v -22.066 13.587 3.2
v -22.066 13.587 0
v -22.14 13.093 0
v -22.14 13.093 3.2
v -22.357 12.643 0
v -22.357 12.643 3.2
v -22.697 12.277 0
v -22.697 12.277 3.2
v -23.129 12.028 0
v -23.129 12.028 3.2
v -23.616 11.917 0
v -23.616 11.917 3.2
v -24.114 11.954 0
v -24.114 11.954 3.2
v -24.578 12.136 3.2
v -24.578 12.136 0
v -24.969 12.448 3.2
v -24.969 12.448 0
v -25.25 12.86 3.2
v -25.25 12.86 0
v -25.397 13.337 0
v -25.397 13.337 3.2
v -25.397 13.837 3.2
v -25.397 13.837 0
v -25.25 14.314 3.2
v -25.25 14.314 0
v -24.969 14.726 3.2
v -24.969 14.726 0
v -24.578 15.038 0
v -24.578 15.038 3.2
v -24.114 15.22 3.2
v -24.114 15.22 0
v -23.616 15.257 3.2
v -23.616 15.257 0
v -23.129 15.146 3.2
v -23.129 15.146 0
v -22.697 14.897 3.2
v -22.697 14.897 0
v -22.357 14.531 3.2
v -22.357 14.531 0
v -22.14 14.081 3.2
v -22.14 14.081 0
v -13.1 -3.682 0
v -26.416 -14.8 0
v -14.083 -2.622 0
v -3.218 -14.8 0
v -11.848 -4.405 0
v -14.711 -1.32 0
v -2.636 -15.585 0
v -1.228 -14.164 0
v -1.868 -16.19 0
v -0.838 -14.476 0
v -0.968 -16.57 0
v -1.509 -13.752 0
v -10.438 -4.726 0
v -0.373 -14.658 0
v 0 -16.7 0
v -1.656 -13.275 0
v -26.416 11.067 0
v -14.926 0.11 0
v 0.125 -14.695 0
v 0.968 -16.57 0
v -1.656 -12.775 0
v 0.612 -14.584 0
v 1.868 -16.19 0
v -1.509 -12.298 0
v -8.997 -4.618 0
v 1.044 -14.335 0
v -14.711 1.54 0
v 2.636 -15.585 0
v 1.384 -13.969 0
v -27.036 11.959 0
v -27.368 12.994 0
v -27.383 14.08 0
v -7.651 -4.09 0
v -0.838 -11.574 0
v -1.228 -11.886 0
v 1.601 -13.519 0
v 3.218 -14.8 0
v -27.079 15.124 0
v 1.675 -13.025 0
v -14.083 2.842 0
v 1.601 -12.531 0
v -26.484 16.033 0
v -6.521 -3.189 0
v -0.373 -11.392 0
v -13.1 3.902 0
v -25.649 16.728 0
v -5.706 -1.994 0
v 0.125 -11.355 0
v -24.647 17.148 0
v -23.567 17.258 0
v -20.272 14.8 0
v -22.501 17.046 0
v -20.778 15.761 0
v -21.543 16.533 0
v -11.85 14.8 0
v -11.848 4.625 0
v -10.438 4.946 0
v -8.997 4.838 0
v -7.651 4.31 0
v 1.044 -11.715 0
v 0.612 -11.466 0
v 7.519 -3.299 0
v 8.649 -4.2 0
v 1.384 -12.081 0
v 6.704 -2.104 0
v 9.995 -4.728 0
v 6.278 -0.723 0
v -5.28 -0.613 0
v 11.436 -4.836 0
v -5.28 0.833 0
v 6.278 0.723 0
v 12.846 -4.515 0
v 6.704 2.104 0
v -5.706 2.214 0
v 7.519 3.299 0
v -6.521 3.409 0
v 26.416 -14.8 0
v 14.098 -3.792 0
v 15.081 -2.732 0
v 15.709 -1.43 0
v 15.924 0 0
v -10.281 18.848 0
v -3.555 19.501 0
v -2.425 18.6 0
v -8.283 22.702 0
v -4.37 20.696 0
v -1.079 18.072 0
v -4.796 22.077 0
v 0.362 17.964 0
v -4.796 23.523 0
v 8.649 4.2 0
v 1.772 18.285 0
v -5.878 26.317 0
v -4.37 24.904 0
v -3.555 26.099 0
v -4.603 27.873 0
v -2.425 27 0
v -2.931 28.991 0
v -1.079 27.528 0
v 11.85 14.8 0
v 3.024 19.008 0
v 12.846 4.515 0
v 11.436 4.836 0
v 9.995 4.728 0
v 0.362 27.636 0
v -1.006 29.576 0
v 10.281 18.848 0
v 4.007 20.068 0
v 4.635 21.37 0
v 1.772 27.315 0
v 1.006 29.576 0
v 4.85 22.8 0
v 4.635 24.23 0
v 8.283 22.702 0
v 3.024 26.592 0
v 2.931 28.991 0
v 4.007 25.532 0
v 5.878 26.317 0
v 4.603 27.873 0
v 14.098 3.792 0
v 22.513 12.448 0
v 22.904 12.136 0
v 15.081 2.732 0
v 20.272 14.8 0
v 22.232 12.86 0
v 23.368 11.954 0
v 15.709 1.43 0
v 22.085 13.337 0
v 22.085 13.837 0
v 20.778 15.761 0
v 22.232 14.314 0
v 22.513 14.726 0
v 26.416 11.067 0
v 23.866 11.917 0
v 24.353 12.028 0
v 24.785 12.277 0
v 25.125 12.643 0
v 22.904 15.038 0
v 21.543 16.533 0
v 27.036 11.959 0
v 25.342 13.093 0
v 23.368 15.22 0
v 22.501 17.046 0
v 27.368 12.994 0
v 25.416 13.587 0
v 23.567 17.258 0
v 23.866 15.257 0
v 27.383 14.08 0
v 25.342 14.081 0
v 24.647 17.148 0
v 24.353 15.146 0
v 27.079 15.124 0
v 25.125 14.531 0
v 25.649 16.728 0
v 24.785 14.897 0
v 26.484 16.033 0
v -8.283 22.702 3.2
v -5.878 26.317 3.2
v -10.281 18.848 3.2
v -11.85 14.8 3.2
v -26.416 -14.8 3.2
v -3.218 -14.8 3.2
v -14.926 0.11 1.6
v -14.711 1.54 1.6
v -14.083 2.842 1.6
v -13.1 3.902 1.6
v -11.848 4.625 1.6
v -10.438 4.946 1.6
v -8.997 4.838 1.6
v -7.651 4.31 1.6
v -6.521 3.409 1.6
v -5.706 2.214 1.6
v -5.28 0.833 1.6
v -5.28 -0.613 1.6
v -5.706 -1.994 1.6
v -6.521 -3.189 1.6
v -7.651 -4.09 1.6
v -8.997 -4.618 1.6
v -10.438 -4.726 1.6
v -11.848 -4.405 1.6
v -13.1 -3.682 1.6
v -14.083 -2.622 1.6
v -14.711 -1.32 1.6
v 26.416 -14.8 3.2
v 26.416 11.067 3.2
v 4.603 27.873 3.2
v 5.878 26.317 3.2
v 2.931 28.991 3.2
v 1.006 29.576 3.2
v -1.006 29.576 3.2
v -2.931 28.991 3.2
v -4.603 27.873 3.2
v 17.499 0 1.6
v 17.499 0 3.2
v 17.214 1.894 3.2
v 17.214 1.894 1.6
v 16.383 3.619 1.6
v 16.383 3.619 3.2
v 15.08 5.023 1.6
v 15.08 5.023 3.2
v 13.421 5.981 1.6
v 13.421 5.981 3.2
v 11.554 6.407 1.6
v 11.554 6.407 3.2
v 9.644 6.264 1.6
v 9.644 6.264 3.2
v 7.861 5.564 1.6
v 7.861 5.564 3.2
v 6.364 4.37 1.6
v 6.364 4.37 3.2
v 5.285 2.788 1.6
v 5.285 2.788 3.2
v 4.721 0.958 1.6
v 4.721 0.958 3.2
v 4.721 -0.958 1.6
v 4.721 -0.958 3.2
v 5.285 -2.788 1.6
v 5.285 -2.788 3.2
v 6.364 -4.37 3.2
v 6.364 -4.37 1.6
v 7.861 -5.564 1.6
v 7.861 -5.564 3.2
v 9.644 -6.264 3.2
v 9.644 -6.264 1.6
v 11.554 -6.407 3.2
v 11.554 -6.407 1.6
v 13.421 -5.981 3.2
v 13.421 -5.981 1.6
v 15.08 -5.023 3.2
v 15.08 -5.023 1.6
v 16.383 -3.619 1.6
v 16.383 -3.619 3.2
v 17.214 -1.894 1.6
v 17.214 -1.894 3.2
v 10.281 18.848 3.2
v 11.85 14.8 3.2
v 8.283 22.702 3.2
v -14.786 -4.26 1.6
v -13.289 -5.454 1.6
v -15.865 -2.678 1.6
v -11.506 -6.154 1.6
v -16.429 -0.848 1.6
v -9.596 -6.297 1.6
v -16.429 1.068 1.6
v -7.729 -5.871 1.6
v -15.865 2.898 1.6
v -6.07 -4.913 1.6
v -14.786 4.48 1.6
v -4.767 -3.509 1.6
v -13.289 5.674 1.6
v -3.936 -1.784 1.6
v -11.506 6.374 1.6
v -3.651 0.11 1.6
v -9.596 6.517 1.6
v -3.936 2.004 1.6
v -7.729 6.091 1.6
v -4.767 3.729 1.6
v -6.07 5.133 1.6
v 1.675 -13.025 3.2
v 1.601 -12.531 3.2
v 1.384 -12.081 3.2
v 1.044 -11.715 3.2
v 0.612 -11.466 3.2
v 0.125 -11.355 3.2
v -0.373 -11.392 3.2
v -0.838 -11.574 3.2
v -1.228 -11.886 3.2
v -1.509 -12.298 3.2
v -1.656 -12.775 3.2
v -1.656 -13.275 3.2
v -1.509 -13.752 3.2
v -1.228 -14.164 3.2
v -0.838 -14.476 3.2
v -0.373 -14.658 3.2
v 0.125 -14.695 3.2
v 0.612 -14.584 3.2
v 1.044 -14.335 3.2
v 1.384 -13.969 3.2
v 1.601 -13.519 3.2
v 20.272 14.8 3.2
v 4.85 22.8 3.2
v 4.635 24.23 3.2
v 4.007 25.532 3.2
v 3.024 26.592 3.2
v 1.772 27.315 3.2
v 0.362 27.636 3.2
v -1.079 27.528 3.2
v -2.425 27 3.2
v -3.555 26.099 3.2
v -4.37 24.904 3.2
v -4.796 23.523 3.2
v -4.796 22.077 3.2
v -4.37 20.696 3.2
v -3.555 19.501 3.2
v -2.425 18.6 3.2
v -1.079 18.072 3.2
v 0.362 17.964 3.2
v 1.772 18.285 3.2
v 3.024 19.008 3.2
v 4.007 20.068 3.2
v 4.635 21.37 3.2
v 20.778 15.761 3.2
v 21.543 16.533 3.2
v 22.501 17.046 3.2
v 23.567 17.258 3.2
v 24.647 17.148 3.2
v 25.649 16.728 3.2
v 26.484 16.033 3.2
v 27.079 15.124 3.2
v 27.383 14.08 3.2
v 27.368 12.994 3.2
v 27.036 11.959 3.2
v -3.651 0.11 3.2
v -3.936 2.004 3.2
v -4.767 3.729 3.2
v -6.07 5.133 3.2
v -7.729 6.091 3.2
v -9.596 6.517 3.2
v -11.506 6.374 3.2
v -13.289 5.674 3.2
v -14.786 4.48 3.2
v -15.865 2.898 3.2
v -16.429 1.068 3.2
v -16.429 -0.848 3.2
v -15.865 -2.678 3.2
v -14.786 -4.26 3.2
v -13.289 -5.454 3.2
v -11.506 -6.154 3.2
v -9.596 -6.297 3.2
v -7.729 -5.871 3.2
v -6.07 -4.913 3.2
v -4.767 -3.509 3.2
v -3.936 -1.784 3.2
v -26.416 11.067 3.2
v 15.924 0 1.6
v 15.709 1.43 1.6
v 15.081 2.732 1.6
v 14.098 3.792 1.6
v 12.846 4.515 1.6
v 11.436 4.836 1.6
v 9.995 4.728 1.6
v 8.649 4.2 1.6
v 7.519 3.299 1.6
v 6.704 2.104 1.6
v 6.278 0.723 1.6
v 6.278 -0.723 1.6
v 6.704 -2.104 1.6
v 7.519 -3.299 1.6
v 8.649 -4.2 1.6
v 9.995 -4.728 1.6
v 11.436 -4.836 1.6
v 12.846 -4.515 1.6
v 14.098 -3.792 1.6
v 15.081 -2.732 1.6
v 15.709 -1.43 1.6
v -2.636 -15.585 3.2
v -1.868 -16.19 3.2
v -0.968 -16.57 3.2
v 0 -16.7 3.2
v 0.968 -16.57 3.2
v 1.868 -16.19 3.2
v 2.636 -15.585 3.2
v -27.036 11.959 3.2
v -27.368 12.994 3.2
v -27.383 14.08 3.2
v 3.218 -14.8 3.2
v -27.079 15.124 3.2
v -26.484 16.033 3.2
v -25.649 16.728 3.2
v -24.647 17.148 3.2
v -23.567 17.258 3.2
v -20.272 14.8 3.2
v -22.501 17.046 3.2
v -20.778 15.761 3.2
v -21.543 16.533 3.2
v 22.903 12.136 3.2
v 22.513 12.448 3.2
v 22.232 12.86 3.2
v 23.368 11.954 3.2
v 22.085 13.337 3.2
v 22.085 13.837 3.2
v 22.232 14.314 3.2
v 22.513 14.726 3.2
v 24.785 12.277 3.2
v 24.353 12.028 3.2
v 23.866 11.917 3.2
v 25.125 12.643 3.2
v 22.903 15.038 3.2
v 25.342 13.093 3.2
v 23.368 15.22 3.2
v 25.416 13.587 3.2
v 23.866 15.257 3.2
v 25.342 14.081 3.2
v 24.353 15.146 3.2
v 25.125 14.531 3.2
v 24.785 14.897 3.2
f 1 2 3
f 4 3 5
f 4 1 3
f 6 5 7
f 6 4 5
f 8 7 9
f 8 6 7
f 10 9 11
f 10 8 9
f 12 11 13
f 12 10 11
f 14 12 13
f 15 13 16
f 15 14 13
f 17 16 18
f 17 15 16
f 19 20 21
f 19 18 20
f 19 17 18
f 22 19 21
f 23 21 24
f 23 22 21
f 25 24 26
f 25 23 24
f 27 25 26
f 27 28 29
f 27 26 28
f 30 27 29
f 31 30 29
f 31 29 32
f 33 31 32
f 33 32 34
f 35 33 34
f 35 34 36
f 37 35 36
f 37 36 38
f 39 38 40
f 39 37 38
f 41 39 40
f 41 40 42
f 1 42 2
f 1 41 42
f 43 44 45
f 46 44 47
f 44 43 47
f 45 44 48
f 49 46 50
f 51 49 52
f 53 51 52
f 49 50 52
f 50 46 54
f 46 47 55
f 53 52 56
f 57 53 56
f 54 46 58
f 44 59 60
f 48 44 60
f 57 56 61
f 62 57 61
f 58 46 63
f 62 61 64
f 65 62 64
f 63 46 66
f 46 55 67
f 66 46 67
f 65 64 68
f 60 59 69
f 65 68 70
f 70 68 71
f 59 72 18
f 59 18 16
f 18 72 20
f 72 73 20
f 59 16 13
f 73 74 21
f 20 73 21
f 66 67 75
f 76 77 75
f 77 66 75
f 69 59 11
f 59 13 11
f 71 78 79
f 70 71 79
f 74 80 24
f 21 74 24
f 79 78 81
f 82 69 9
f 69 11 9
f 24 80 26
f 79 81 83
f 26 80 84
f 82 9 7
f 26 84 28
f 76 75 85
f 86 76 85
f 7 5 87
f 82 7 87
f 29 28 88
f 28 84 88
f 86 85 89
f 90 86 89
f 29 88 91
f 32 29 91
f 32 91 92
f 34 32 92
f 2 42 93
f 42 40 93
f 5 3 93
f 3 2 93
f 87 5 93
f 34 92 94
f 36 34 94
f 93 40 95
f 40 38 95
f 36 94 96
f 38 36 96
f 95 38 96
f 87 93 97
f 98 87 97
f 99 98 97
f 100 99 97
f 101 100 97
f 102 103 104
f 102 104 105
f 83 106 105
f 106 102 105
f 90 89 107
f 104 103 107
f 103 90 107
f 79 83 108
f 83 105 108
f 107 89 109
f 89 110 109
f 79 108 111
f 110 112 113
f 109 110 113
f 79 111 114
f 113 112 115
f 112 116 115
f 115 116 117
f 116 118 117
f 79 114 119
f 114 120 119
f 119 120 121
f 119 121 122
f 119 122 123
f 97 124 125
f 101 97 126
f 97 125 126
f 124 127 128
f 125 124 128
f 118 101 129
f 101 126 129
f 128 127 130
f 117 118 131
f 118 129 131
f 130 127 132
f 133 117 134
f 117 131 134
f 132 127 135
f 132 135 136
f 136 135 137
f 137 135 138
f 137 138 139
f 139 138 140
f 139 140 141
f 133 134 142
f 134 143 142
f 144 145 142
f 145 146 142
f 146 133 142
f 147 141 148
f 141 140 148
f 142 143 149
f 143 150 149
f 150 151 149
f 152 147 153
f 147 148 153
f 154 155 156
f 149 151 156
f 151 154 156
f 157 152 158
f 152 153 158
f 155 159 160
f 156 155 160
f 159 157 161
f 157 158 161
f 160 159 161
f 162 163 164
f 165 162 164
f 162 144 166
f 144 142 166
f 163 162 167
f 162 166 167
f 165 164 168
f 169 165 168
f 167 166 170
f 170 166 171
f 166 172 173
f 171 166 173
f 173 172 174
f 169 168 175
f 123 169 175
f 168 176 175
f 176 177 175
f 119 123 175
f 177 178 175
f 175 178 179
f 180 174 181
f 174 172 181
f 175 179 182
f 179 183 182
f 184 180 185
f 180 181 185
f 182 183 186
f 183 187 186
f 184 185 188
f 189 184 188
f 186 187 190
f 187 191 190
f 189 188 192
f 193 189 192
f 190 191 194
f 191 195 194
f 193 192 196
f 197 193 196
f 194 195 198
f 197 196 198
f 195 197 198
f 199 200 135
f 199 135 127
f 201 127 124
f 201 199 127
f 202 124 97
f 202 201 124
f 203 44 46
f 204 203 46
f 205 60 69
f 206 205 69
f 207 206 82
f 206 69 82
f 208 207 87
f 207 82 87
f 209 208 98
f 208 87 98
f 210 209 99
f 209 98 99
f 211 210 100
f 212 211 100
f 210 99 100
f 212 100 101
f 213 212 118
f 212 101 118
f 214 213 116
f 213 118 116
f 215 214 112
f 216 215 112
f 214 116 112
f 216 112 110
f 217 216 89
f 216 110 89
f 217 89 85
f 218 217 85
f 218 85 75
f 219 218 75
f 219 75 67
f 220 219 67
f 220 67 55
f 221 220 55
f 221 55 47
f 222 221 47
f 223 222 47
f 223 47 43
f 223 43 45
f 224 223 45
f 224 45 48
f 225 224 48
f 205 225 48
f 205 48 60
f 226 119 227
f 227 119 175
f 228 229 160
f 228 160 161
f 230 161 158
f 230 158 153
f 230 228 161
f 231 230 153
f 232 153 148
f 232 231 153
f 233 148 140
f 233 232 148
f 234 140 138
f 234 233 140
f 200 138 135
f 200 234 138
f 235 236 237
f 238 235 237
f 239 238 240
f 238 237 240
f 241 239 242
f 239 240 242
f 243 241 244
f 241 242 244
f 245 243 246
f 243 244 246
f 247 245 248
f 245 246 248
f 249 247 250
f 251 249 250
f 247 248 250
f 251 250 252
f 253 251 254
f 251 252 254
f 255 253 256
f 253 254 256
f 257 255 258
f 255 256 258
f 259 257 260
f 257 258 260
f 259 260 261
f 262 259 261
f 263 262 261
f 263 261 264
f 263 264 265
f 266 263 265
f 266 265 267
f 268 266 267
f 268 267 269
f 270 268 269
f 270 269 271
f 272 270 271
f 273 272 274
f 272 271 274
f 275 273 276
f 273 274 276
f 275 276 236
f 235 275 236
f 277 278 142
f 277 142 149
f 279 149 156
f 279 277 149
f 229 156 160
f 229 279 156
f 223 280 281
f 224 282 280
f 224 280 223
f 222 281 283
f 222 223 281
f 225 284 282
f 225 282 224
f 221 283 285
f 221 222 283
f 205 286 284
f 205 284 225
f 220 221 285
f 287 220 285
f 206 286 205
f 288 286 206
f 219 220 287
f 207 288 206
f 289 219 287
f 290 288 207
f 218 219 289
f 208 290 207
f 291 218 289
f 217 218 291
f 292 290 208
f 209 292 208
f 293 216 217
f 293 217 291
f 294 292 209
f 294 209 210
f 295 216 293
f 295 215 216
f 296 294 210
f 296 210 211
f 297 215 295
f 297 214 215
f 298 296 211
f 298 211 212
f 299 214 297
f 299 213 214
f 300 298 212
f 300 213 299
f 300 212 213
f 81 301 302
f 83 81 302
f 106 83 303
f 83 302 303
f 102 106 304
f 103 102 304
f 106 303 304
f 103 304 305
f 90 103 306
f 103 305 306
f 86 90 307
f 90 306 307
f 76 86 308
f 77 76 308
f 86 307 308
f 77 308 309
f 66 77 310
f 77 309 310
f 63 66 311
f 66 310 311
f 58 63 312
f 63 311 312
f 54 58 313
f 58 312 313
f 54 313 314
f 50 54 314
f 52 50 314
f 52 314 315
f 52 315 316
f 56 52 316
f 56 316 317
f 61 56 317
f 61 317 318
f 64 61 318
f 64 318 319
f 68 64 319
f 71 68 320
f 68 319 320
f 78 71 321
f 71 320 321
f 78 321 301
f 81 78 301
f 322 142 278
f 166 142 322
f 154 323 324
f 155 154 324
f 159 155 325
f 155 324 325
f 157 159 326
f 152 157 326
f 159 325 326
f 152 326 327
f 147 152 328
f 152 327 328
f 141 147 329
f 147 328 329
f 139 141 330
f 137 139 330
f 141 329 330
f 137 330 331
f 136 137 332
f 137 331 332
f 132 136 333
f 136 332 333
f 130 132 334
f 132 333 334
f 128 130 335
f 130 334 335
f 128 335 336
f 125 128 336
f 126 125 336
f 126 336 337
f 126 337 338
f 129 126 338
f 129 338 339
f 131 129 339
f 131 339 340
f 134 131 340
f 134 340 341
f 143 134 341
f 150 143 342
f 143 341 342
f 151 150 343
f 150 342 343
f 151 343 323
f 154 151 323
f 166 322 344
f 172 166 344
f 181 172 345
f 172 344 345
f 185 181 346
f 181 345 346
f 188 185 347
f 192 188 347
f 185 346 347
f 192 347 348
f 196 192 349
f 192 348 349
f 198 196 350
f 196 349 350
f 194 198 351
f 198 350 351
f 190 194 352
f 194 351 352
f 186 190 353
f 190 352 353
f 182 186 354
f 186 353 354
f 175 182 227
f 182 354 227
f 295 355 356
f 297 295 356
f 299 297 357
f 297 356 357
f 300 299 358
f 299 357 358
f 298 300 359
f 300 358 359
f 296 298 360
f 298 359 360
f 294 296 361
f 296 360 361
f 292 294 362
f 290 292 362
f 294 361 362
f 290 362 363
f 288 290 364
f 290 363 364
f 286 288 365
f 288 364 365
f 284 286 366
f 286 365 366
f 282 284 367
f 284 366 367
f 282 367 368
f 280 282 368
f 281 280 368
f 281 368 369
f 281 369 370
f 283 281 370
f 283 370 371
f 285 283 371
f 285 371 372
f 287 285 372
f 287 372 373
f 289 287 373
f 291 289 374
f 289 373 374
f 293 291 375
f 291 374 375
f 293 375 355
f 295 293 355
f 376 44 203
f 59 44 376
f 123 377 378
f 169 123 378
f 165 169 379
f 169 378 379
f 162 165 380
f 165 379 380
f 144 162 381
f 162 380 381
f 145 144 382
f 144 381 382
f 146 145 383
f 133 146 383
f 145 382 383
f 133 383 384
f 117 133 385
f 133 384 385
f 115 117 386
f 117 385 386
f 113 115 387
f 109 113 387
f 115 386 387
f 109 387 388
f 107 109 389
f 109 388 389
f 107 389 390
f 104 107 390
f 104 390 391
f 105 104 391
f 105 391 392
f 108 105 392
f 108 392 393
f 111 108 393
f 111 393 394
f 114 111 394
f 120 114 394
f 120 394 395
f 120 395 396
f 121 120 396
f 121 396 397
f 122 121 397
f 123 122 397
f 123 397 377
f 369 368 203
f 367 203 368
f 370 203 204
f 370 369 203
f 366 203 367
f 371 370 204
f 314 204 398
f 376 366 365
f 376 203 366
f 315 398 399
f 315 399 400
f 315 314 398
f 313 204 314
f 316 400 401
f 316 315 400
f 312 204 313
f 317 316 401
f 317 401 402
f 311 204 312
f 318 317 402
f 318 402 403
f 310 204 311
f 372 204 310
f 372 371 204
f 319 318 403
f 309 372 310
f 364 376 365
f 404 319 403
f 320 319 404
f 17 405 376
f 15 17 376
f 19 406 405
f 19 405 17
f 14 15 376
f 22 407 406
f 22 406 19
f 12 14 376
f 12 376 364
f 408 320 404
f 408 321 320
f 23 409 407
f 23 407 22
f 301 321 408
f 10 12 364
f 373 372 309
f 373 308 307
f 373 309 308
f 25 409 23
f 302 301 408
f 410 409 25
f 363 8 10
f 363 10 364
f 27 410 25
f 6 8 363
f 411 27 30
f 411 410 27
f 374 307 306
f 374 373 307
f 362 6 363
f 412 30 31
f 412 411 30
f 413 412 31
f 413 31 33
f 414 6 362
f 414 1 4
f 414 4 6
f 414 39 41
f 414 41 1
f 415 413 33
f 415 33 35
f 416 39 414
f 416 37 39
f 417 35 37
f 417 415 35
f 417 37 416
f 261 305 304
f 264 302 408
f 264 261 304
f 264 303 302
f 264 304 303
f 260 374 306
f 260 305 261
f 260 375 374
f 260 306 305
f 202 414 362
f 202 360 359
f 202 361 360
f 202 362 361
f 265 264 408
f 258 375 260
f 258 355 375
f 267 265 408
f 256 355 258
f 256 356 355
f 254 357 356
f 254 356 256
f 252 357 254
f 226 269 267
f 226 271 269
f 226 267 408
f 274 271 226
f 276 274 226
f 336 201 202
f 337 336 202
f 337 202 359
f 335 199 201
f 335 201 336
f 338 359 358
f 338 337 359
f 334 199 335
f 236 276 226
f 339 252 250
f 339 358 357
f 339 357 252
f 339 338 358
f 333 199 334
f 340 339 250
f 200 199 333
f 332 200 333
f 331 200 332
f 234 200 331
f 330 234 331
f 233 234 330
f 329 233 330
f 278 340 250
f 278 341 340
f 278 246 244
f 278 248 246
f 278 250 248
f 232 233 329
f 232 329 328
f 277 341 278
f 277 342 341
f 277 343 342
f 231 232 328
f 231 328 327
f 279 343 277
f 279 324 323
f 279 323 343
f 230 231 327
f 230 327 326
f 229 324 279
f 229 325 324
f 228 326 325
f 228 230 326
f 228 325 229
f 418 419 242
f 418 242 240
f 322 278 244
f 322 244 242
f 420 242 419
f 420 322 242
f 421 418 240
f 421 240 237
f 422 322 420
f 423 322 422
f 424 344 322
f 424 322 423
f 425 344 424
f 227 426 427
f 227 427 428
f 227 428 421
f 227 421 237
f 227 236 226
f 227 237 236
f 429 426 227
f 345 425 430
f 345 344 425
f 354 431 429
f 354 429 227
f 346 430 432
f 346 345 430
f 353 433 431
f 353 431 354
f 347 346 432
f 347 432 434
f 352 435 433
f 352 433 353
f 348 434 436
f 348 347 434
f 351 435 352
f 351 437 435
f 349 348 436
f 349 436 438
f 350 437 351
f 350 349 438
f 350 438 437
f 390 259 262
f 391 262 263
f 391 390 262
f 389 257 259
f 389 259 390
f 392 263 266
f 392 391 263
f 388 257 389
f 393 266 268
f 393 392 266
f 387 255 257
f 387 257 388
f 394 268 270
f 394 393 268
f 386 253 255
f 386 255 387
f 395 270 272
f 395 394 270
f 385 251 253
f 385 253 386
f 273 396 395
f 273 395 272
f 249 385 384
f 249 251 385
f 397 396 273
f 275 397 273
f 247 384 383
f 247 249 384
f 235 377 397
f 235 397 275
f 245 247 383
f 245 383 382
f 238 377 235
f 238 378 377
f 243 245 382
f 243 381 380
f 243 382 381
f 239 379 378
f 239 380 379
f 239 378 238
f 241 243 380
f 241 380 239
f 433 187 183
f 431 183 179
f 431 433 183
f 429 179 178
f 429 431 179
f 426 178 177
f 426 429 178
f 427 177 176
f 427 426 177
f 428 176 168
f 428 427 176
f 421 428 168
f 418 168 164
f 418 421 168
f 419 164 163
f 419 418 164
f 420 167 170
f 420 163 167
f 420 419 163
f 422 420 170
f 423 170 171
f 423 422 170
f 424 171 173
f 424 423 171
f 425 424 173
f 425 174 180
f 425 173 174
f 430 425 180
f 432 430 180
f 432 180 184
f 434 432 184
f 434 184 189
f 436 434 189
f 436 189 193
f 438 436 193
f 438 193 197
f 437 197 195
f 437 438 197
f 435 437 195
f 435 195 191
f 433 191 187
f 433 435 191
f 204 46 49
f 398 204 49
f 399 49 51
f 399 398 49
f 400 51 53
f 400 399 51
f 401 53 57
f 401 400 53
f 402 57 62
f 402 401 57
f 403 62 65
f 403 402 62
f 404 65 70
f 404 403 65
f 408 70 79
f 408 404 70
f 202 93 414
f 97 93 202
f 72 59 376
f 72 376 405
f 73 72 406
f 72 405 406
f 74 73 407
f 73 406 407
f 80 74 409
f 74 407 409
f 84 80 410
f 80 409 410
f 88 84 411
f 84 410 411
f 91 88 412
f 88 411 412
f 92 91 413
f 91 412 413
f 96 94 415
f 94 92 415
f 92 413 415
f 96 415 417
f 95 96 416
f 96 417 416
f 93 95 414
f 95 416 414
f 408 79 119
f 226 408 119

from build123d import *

# Parameters (mm, degrees)
SKETCH1_W            = 6.266
SKETCH1_H            = 19.6
SKETCH1_R            = 1.475
SKETCH1_W_2          = 52.832
SKETCH1_H_2          = 5
BOSS_EXTRUDE2_DEPTH  = 3.2
SKETCH3_R            = 6.85
SKETCH3_R_2          = 4.85
BOSS_EXTRUDE3_DEPTH  = 5.975
SKETCH5_R            = 6.85
CUT_EXTRUDE2_DEPTH   = 2.4892
SKETCH10_R           = 6.846
BOSS_EXTRUDE10_DEPTH = 3.4858
SKETCH11_W           = 13.7
SKETCH11_H           = 5
BOSS_EXTRUDE11_DEPTH = 5.975
SKETCH15_W           = 52.832
SKETCH15_H           = 29.6
BOSS_EXTRUDE13_DEPTH = 3.2
SKETCH18_R           = 4.85
CUT_EXTRUDE9_DEPTH   = 32.638989886
SKETCH17_W           = 26.060927771
SKETCH17_H           = 40.585710908
CUT_EXTRUDE10_DEPTH  = 5.975
SKETCH12_W           = 52.832
SKETCH12_H           = 29.6
BOSS_EXTRUDE12_DEPTH = 3.2
SKETCH13_R           = 4.85
CUT_EXTRUDE3_DEPTH   = 10
SKETCH19_R           = 1.675
CUT_EXTRUDE11_DEPTH  = 3.2
SKETCH20_R           = 3.675
SKETCH20_R_2         = 1.675
BOSS_EXTRUDE14_DEPTH = 3.2
BOSS_EXTRUDE15_START = -3.2
SKETCH21_R           = 3.675
SKETCH21_R_2         = 1.675
BOSS_EXTRUDE15_DEPTH = 3.2
SKETCH27_R           = 4.85
CUT_EXTRUDE18_DEPTH  = 188
SKETCH30_R           = 6.85
SKETCH30_R_2         = 4.85
BOSS_EXTRUDE17_DEPTH = 3.2
BOSS_EXTRUDE18_DEPTH = 3.2
SKETCH32_R           = 6.425
CUT_EXTRUDE19_DEPTH  = 1.6


with BuildPart() as part:
    # Sketch1 → Boss-Extrude2 (new body)
    # profile 1 of 4: a face of its own
    with BuildSketch(Plane.XY):
        with Locations((-23.283, 0)):
            Rectangle(SKETCH1_W, SKETCH1_H)
        with Locations((-23.95, -4.974)):
            Circle(SKETCH1_R, mode=Mode.SUBTRACT)
        with Locations((-23.95, 4.974)):
            Circle(SKETCH1_R, mode=Mode.SUBTRACT)
    # profile 2 of 4: a face of its own
    with BuildSketch(Plane.XY):
        with Locations((23.283, 0)):
            Rectangle(SKETCH1_W, SKETCH1_H)
        with Locations((23.95, -4.974)):
            Circle(SKETCH1_R, mode=Mode.SUBTRACT)
        with Locations((23.95, 4.974)):
            Circle(SKETCH1_R, mode=Mode.SUBTRACT)
    # profile 3 of 4: a face of its own
    with BuildSketch(Plane.XY):
        with Locations((0, 12.3)):
            Rectangle(SKETCH1_W_2, SKETCH1_H_2)
    # profile 4 of 4: a face of its own
    with BuildSketch(Plane.XY):
        with Locations((0, -12.3)):
            Rectangle(SKETCH1_W_2, SKETCH1_H_2)
    extrude(amount=BOSS_EXTRUDE2_DEPTH)



with BuildPart() as body_2:
    # Sketch3 → Boss-Extrude3 (new body)
    with BuildSketch(Plane(origin=(0, 0, 0), x_dir=(-1, 0, 0), z_dir=(0, 0, -1))):
        with Locations(Location((10.076, 0.11, 0), (0, 0, 180))):
            Circle(SKETCH3_R)
        with Locations(Location((10.076, 0.11, 0), (0, 0, 180))):
            Circle(SKETCH3_R_2, mode=Mode.SUBTRACT)
    extrude(amount=BOSS_EXTRUDE3_DEPTH)

    # Sketch5 → Cut-Extrude2 (cut)
    with BuildSketch(Plane.XY):
        with Locations((-10.076, 0.11)):
            Circle(SKETCH5_R)
    extrude(amount=-CUT_EXTRUDE2_DEPTH, mode=Mode.SUBTRACT)

    # Sketch10 → Boss-Extrude10 (add)
    with BuildSketch(Plane(origin=(0, 0, -5.975), x_dir=(-1, 0, 0), z_dir=(0, 0, -1))):
        Polygon((16.93, -14.8), (16.93, 14.8), (3.23, 14.8), (3.23, 0.11), (3.23, -14.8), align=None)
        with Locations((10.076, 0.11)):
            Circle(SKETCH10_R, mode=Mode.SUBTRACT)
    extrude(amount=-BOSS_EXTRUDE10_DEPTH)


with BuildPart() as boss_extrude10_kept_piece:
    # of the separate pieces the step leaves, the one the design keeps (boss_extrude10_pieces_kept)
    add(body_2.part.solids().sort_by_distance((-3.23, -0.124059821, -5.975))[0])


with BuildPart() as part_1:
    add(part.part)

    add(boss_extrude10_kept_piece.part)  # Boss-Extrude11 merges Boss-Extrude10 kept piece
    # Sketch11 → Boss-Extrude11 (add)
    with BuildSketch(Plane(origin=(0, 0, -5.975), x_dir=(-1, 0, 0), z_dir=(0, 0, -1))):
        with Locations((10.08, 12.3)):
            Rectangle(SKETCH11_W, SKETCH11_H)
        with Locations((10.08, -12.3)):
            Rectangle(SKETCH11_W, SKETCH11_H)
    extrude(amount=-BOSS_EXTRUDE11_DEPTH)

    # Sketch15 → Boss-Extrude13 (add)
    with BuildSketch(Plane(origin=(0, 0, 0), x_dir=(-1, 0, 0), z_dir=(0, 0, -1))):
        Rectangle(SKETCH15_W, SKETCH15_H)
    extrude(amount=-BOSS_EXTRUDE13_DEPTH)

    # Sketch18 → Cut-Extrude9 (cut, through all)
    with BuildSketch(Plane(origin=(0, 0, -5.975), x_dir=(-1, 0, 0), z_dir=(0, 0, -1))):
        with Locations(Location((10.076, 0.11, 0), (0, 0, 180))):
            Circle(SKETCH18_R)
    extrude(amount=-CUT_EXTRUDE9_DEPTH, mode=Mode.SUBTRACT)

    # Sketch17 → Cut-Extrude10 (cut)
    with BuildSketch(Plane(origin=(0, 0, -5.975), x_dir=(-1, 0, 0), z_dir=(0, 0, -1))):
        with Locations((8.607278897, -0.029886385)):
            Rectangle(SKETCH17_W, SKETCH17_H)
    extrude(amount=-CUT_EXTRUDE10_DEPTH, mode=Mode.SUBTRACT)

    # Sketch12 → Boss-Extrude12 (add)
    with BuildSketch(Plane.XY.offset(3.2)):
        Rectangle(SKETCH12_W, SKETCH12_H)
    extrude(amount=-BOSS_EXTRUDE12_DEPTH)

    # Sketch13 → Cut-Extrude3 (cut)
    with BuildSketch(Plane(origin=(0, 0, 0), x_dir=(-1, 0, 0), z_dir=(0, 0, -1))):
        with Locations((10.076, 0.11)):
            Circle(SKETCH13_R)
    extrude(amount=-CUT_EXTRUDE3_DEPTH, mode=Mode.SUBTRACT)

    # Sketch19 → Cut-Extrude11 (cut)
    with BuildSketch(Plane.XY.offset(3.2)):
        with Locations((0, -13.025)):
            Circle(SKETCH19_R)
        with Locations((-23.741, 13.587)):
            Circle(SKETCH19_R)
        with Locations((23.741, 13.587)):
            Circle(SKETCH19_R)
    extrude(amount=-CUT_EXTRUDE11_DEPTH, mode=Mode.SUBTRACT)

    # Sketch20 → Boss-Extrude14 (add)
    with BuildSketch(Plane.XY.offset(3.2)):
        with Locations((0, -13.025)):
            Circle(SKETCH20_R)
        with Locations((0, -13.025)):
            Circle(SKETCH20_R_2, mode=Mode.SUBTRACT)
    extrude(amount=-BOSS_EXTRUDE14_DEPTH)

    # Sketch21 → Boss-Extrude15 (add)
    # profile 1 of 2: a face of its own
    with BuildSketch(Plane(origin=(0, 0, 0), x_dir=(-1, 0, 0), z_dir=(0, 0, -1)).offset(BOSS_EXTRUDE15_START)):
        with Locations((23.741, 13.587)):
            Circle(SKETCH21_R)
        with Locations(Location((23.741, 13.587, 0), (0, 0, 180))):
            Circle(SKETCH21_R_2, mode=Mode.SUBTRACT)
    # profile 2 of 2: a face of its own
    with BuildSketch(Plane(origin=(0, 0, 0), x_dir=(-1, 0, 0), z_dir=(0, 0, -1)).offset(BOSS_EXTRUDE15_START)):
        with Locations((-23.741, 13.587)):
            Circle(SKETCH21_R)
        with Locations(Location((-23.741, 13.587, 0), (0, 0, 180))):
            Circle(SKETCH21_R_2, mode=Mode.SUBTRACT)
    extrude(amount=BOSS_EXTRUDE15_DEPTH)

    # Sketch27 → Cut-Extrude18 (cut)
    with BuildSketch(Plane.XY.offset(3.2)):
        with Locations((11.074, 0)):
            Circle(SKETCH27_R)
    extrude(amount=-CUT_EXTRUDE18_DEPTH, mode=Mode.SUBTRACT)

    # Sketch30 → Boss-Extrude17 (add)
    # profile 1 of 2: a face of its own
    with BuildSketch(Plane.XY.offset(3.2)):
        with Locations((0, 22.8)):
            Circle(SKETCH30_R)
        with Locations((0, 22.8)):
            Circle(SKETCH30_R_2, mode=Mode.SUBTRACT)
    # profile 2 of 2: a face of its own
    with BuildSketch(Plane.XY.offset(3.2)):
        with BuildLine():
            ThreePointArc((6.85, 22.8), (0, 15.95), (-6.85, 22.8))
            Line((-6.85, 22.8), (-6.85, 14.8))
            Line((-6.85, 14.8), (6.85, 14.8))
            Line((6.85, 14.8), (6.85, 22.8))
        make_face()
    extrude(amount=-BOSS_EXTRUDE17_DEPTH)

    # Sketch31 → Boss-Extrude18 (add)
    with BuildSketch(Plane.XY.offset(3.2)):
        with BuildLine():
            Line((-6.85, 14.8), (-6.85, 22.8))
            ThreePointArc((-6.85, 22.8), (-6.602617872, 24.624263479), (-5.878339492, 26.316763401))
            ThreePointArc((-5.878339492, 26.316763401), (-9.334173967, 20.802087814), (-11.85, 14.8))
            Line((-11.85, 14.8), (-6.85, 14.8))
        make_face()
        with BuildLine():
            ThreePointArc((5.878339492, 26.316763401), (6.602617872, 24.624263479), (6.85, 22.8))
            Line((6.85, 22.8), (6.85, 14.8))
            Line((6.85, 14.8), (11.85, 14.8))
            ThreePointArc((11.85, 14.8), (9.334173967, 20.802087814), (5.878339492, 26.316763401))
        make_face()
    extrude(amount=-BOSS_EXTRUDE18_DEPTH)

    # Sketch32 → Cut-Extrude19 (cut)
    with BuildSketch(Plane.XY.offset(3.2)):
        with Locations((-10.076, 0.11)):
            Circle(SKETCH32_R)
        with Locations((11.074, 0)):
            Circle(SKETCH32_R)
    extrude(amount=-CUT_EXTRUDE19_DEPTH, mode=Mode.SUBTRACT)


solid = part_1.part
